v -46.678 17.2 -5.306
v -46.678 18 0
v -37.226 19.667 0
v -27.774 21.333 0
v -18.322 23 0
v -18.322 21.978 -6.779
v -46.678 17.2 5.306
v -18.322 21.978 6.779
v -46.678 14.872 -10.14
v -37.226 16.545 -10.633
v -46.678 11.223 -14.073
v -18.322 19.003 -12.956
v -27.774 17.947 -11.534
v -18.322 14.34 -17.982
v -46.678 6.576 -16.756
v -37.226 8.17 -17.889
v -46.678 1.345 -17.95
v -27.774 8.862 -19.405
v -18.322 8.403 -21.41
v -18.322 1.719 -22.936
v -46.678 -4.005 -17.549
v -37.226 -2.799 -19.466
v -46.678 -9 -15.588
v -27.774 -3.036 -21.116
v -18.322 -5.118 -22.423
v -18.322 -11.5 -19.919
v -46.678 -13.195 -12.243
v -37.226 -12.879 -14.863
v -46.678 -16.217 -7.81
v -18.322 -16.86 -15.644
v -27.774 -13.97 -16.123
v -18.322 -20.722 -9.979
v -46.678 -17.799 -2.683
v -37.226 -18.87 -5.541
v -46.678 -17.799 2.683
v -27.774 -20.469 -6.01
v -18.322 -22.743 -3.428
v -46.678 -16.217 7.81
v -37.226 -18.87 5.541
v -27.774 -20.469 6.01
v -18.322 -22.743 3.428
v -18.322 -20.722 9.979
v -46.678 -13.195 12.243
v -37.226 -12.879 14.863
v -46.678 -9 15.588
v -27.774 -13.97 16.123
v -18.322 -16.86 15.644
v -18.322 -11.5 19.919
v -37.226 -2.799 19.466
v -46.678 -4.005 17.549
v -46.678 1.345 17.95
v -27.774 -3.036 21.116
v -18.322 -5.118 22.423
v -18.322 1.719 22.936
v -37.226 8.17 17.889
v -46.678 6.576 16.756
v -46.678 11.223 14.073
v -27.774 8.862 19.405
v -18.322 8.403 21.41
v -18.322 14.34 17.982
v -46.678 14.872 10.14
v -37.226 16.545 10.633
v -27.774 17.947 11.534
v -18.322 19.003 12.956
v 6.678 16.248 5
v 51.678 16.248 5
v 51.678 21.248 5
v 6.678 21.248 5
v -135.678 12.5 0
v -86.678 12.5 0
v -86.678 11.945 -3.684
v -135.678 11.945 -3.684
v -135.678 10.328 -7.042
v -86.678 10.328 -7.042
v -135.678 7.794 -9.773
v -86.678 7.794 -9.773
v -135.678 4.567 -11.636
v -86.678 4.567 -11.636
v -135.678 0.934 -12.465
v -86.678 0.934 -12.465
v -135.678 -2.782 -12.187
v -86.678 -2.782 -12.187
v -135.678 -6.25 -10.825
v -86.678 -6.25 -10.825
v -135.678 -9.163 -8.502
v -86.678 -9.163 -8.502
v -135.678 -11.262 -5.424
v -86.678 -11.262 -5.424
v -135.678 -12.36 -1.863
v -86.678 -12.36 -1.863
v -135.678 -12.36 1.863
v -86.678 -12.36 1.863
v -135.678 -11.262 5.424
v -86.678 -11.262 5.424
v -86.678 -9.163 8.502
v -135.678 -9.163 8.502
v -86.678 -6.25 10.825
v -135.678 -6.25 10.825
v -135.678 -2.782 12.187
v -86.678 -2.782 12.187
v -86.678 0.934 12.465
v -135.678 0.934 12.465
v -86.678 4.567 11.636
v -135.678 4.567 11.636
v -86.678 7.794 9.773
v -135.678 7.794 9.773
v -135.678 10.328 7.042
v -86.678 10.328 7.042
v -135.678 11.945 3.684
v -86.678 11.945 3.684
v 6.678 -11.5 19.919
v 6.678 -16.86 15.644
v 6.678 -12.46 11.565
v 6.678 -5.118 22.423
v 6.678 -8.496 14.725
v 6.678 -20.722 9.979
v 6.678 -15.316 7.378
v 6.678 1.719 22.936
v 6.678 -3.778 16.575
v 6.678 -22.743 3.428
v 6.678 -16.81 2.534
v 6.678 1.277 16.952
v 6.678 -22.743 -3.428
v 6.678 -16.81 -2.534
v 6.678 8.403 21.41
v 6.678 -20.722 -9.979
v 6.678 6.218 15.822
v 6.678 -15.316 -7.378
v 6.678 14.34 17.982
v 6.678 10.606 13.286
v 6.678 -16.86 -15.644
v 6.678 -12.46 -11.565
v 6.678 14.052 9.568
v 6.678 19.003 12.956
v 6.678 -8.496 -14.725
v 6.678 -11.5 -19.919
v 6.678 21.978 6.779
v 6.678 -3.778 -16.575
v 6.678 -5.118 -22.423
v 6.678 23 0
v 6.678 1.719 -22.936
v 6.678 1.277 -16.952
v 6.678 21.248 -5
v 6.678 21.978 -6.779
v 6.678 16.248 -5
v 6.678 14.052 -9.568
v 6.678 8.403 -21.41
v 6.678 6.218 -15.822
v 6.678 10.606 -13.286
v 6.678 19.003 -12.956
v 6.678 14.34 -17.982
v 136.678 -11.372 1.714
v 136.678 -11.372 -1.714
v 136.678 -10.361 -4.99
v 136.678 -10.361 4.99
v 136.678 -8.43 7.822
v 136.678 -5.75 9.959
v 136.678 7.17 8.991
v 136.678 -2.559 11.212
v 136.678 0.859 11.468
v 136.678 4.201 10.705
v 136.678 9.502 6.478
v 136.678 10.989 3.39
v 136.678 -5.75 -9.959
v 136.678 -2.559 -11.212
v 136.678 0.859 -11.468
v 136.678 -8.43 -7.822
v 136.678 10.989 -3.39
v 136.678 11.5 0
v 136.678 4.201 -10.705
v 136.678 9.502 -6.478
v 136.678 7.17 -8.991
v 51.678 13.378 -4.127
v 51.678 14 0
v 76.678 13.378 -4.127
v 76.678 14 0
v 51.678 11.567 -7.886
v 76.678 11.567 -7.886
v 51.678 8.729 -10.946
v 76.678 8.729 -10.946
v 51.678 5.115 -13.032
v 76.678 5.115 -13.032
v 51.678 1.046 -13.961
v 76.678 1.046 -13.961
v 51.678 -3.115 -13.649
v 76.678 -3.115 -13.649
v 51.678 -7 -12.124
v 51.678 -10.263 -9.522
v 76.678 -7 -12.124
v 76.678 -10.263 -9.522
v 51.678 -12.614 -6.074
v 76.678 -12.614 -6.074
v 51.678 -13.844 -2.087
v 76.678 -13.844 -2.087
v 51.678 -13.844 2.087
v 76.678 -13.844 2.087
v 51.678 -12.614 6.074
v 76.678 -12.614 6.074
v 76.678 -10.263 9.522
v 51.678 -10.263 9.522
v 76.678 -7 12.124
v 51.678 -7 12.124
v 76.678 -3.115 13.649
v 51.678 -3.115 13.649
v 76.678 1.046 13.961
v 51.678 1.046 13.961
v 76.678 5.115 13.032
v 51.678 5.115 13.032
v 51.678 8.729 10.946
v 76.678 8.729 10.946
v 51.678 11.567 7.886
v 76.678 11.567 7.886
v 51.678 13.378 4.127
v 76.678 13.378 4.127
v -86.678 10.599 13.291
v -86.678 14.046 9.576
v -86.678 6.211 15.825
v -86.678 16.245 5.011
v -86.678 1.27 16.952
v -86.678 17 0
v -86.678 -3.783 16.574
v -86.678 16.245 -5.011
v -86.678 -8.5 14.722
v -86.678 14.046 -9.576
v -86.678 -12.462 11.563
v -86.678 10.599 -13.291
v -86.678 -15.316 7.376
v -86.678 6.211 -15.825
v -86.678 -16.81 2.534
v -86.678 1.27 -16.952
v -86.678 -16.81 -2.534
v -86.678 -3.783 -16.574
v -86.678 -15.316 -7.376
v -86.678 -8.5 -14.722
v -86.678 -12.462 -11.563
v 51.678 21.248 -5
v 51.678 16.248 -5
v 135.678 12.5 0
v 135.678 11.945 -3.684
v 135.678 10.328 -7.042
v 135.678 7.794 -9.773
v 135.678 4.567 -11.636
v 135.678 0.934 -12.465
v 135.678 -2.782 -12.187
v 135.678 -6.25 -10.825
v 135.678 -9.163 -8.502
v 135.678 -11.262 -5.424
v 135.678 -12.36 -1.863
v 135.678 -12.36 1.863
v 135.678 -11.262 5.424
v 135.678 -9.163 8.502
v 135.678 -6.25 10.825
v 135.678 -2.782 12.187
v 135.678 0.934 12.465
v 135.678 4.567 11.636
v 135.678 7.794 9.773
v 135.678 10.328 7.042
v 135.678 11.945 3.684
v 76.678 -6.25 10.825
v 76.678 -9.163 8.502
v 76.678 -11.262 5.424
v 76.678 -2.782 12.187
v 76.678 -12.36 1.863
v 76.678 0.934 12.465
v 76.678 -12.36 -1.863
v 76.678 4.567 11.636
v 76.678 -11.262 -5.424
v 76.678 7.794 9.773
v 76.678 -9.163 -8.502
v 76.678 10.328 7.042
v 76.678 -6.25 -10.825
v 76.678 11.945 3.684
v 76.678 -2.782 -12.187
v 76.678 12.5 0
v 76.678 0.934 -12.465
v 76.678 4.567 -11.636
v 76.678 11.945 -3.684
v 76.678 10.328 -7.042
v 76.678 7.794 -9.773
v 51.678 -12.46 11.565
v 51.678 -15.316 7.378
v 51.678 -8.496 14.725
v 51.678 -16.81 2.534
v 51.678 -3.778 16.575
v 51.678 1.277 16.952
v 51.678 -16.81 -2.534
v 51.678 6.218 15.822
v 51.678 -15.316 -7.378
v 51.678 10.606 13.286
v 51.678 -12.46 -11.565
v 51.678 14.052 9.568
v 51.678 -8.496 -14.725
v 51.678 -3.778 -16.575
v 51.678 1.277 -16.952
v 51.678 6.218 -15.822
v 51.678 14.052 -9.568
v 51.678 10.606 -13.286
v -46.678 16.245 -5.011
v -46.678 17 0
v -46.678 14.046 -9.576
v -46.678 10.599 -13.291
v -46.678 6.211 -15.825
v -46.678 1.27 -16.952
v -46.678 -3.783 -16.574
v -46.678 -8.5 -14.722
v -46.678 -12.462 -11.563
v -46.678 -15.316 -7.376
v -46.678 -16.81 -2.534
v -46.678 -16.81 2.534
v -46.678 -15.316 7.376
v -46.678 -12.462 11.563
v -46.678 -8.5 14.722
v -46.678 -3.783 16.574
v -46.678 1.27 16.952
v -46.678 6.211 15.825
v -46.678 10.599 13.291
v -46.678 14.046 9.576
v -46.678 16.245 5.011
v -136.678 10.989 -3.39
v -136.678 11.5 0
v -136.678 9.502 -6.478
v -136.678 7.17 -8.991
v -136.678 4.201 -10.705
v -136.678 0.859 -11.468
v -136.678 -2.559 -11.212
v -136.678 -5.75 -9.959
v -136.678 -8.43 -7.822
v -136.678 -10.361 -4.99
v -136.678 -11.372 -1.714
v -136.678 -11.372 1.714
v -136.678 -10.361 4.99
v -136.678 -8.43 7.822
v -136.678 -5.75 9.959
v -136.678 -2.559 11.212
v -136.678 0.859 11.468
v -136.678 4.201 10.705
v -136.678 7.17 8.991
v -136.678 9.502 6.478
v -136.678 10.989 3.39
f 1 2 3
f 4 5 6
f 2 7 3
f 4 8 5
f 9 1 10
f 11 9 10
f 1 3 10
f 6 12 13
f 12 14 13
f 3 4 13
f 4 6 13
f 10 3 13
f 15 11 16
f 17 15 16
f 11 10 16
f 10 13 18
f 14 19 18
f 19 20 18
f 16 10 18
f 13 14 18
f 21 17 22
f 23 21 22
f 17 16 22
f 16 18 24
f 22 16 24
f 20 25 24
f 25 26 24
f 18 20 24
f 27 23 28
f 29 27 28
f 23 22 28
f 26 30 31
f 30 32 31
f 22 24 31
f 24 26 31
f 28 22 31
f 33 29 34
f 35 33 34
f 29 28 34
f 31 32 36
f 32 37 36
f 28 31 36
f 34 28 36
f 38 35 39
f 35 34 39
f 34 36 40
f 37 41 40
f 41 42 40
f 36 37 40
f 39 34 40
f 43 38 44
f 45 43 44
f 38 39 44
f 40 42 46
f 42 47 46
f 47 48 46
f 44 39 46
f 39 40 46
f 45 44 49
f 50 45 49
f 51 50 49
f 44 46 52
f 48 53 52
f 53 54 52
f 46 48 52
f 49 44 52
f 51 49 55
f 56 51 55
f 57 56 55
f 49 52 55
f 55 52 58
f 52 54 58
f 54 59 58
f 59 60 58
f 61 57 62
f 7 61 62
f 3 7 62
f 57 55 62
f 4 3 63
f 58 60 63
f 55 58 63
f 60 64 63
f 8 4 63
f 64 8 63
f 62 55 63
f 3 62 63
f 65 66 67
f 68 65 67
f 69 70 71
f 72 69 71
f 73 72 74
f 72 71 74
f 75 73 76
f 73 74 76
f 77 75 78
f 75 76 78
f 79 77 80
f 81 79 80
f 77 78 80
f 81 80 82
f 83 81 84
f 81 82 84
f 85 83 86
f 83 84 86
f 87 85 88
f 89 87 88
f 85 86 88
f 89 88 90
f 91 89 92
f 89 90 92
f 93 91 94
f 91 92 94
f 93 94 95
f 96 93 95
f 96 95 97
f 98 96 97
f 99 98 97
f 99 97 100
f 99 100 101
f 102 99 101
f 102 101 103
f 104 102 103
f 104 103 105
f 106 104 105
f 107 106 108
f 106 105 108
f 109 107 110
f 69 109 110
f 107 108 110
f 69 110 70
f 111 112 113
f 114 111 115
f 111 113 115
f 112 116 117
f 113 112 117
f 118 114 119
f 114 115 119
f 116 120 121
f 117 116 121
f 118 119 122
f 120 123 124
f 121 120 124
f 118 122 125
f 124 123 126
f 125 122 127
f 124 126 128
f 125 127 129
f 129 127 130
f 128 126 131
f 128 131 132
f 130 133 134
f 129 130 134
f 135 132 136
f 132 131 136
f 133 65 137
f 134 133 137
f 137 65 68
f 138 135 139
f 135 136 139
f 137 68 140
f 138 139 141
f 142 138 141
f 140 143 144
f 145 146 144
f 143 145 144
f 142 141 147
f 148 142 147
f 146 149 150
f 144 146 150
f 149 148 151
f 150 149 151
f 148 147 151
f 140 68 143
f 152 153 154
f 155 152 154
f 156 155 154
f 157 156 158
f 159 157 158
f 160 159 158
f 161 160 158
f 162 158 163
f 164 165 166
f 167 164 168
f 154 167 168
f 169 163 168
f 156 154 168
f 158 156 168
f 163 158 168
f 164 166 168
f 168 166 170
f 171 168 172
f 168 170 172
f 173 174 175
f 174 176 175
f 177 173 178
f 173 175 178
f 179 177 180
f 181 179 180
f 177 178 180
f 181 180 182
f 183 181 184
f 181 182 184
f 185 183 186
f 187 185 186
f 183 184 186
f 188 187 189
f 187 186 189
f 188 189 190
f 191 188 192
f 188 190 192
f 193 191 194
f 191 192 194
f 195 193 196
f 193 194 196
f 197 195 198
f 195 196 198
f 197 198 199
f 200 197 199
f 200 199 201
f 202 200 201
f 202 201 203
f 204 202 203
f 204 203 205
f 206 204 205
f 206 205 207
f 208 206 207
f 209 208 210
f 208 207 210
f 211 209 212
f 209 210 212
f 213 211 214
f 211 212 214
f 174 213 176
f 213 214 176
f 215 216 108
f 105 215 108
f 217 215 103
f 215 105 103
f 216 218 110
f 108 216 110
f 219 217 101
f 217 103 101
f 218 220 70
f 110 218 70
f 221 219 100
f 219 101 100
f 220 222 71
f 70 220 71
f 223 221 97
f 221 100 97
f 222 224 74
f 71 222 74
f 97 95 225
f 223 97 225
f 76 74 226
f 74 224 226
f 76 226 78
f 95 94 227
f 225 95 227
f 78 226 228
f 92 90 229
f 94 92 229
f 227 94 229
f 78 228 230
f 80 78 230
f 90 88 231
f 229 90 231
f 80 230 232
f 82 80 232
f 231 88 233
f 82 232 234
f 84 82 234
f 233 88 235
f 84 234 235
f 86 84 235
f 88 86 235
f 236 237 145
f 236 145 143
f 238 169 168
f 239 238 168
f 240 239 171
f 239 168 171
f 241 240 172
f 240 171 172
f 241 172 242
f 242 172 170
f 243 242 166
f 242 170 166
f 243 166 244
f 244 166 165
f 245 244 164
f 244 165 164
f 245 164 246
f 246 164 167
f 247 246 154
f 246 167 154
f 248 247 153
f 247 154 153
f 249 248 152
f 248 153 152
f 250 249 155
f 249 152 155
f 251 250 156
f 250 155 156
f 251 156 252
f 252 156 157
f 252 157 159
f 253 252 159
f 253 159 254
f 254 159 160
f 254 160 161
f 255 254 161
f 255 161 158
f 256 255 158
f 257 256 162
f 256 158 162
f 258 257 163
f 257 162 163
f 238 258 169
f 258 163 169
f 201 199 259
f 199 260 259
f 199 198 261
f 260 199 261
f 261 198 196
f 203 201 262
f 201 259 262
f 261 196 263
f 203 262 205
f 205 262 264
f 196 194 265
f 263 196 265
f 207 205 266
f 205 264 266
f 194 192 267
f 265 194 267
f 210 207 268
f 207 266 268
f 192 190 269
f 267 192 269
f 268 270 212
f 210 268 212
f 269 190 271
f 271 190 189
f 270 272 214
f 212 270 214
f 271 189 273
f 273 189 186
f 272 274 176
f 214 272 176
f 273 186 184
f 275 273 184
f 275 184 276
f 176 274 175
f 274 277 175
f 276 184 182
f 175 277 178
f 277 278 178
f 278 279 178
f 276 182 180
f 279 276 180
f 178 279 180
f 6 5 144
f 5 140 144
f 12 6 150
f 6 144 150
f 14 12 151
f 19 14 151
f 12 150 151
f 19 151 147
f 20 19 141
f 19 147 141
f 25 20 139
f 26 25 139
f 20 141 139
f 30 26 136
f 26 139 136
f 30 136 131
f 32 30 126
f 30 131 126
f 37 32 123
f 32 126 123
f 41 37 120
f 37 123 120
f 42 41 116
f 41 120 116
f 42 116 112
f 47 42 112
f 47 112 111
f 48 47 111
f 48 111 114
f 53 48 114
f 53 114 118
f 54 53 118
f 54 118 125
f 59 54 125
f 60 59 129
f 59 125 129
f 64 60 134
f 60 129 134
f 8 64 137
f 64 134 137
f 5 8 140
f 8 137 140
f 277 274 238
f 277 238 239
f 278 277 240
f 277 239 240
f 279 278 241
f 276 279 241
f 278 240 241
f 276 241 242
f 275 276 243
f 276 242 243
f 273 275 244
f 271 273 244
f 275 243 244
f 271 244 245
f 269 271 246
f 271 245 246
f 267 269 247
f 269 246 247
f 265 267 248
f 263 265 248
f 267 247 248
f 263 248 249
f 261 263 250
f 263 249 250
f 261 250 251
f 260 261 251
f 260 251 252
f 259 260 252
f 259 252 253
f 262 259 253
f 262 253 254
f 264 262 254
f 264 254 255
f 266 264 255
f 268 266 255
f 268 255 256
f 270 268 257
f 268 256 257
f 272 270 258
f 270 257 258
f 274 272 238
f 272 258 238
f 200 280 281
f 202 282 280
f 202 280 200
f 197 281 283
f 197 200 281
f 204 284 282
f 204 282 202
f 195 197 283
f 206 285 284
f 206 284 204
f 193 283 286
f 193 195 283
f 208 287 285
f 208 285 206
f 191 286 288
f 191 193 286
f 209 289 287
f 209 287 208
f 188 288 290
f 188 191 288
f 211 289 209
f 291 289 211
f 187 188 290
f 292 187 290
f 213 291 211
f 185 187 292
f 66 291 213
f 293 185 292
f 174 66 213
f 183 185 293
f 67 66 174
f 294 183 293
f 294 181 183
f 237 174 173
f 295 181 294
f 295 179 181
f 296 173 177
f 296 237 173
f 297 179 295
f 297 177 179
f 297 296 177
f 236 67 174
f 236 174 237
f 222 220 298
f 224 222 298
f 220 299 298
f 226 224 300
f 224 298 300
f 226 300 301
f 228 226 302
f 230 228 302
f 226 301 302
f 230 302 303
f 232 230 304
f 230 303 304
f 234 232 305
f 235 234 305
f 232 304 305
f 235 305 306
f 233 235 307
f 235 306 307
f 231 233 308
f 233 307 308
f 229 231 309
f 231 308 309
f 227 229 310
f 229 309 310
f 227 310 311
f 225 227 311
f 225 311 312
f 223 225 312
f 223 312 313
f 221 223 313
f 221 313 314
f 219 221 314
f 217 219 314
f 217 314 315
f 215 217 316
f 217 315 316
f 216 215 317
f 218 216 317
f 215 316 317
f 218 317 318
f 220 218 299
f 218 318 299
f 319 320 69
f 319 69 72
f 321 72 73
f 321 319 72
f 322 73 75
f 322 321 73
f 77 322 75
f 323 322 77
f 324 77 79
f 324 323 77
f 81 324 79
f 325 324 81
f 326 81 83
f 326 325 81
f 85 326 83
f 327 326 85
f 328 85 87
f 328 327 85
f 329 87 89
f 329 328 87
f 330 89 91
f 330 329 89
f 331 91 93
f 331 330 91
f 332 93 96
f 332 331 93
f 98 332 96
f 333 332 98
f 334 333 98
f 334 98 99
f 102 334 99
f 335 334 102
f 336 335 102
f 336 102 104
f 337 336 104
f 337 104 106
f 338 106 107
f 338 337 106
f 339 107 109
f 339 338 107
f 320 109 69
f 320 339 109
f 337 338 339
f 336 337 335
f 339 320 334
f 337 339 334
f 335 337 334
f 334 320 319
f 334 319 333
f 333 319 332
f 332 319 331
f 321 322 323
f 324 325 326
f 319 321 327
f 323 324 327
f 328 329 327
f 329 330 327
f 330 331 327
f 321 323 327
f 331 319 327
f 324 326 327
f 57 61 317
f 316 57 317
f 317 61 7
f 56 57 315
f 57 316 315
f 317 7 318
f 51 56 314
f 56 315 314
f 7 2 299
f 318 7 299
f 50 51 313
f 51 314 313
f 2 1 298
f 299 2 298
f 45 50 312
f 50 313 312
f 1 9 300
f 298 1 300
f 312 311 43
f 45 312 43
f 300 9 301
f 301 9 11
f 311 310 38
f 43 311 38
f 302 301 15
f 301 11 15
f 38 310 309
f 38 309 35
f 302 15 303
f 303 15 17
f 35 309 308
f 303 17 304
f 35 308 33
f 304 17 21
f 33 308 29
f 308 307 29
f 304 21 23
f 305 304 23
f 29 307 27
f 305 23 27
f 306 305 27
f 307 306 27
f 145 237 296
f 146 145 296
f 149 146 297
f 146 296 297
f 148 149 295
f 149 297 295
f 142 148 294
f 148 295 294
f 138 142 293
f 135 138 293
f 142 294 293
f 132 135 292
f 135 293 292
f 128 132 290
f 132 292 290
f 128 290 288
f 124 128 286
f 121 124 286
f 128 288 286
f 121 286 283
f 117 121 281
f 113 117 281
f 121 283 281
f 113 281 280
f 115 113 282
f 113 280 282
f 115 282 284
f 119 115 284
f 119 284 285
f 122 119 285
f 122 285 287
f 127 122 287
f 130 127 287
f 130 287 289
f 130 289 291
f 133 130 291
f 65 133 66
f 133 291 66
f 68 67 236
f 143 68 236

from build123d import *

# Parameters (mm, degrees)
SKETCH3_W           = 10
SKETCH3_H           = 5
BOSS_EXTRUDE1_DEPTH = 45
CHAMFER1_SIZE       = 1


with BuildPart() as part:
    # Sketch1 → Revolve1 (revolve)
    with BuildSketch(Plane.XY):
        Polygon((-136.678204549, 12.5), (-86.678204549, 12.5), (-86.678204549, 17), (-46.678204549, 17), (-46.678204549, 18), (-18.321795451, 23), (6.678204549, 23), (6.678204549, 17), (51.678204549, 17), (51.678204549, 14), (76.678204549, 14), (76.678204549, 12.5), (136.678204549, 12.5), (136.678204549, 0), (-136.678204549, 0), align=None)
    revolve(axis=Axis((136.678204549, 0, 0), (-1, 0, 0)))

    # Sketch3 → Boss-Extrude1 (add)
    with BuildSketch(Plane(origin=(51.678204549, 0, 0), x_dir=(0, 0, -1), z_dir=(1, 0, 0))):
        with Locations((0, 18.748076809)):
            Rectangle(SKETCH3_W, SKETCH3_H)
    extrude(amount=-BOSS_EXTRUDE1_DEPTH)

    # Chamfer1
    chamfer1_edges = [part.edges().sort_by_distance(p)[0] for p in [
        (136.678204549, -12.5, 0),
        (-136.678204549, -12.5, 0),
    ]]
    chamfer(chamfer1_edges, length=CHAMFER1_SIZE)


solid = part.part
